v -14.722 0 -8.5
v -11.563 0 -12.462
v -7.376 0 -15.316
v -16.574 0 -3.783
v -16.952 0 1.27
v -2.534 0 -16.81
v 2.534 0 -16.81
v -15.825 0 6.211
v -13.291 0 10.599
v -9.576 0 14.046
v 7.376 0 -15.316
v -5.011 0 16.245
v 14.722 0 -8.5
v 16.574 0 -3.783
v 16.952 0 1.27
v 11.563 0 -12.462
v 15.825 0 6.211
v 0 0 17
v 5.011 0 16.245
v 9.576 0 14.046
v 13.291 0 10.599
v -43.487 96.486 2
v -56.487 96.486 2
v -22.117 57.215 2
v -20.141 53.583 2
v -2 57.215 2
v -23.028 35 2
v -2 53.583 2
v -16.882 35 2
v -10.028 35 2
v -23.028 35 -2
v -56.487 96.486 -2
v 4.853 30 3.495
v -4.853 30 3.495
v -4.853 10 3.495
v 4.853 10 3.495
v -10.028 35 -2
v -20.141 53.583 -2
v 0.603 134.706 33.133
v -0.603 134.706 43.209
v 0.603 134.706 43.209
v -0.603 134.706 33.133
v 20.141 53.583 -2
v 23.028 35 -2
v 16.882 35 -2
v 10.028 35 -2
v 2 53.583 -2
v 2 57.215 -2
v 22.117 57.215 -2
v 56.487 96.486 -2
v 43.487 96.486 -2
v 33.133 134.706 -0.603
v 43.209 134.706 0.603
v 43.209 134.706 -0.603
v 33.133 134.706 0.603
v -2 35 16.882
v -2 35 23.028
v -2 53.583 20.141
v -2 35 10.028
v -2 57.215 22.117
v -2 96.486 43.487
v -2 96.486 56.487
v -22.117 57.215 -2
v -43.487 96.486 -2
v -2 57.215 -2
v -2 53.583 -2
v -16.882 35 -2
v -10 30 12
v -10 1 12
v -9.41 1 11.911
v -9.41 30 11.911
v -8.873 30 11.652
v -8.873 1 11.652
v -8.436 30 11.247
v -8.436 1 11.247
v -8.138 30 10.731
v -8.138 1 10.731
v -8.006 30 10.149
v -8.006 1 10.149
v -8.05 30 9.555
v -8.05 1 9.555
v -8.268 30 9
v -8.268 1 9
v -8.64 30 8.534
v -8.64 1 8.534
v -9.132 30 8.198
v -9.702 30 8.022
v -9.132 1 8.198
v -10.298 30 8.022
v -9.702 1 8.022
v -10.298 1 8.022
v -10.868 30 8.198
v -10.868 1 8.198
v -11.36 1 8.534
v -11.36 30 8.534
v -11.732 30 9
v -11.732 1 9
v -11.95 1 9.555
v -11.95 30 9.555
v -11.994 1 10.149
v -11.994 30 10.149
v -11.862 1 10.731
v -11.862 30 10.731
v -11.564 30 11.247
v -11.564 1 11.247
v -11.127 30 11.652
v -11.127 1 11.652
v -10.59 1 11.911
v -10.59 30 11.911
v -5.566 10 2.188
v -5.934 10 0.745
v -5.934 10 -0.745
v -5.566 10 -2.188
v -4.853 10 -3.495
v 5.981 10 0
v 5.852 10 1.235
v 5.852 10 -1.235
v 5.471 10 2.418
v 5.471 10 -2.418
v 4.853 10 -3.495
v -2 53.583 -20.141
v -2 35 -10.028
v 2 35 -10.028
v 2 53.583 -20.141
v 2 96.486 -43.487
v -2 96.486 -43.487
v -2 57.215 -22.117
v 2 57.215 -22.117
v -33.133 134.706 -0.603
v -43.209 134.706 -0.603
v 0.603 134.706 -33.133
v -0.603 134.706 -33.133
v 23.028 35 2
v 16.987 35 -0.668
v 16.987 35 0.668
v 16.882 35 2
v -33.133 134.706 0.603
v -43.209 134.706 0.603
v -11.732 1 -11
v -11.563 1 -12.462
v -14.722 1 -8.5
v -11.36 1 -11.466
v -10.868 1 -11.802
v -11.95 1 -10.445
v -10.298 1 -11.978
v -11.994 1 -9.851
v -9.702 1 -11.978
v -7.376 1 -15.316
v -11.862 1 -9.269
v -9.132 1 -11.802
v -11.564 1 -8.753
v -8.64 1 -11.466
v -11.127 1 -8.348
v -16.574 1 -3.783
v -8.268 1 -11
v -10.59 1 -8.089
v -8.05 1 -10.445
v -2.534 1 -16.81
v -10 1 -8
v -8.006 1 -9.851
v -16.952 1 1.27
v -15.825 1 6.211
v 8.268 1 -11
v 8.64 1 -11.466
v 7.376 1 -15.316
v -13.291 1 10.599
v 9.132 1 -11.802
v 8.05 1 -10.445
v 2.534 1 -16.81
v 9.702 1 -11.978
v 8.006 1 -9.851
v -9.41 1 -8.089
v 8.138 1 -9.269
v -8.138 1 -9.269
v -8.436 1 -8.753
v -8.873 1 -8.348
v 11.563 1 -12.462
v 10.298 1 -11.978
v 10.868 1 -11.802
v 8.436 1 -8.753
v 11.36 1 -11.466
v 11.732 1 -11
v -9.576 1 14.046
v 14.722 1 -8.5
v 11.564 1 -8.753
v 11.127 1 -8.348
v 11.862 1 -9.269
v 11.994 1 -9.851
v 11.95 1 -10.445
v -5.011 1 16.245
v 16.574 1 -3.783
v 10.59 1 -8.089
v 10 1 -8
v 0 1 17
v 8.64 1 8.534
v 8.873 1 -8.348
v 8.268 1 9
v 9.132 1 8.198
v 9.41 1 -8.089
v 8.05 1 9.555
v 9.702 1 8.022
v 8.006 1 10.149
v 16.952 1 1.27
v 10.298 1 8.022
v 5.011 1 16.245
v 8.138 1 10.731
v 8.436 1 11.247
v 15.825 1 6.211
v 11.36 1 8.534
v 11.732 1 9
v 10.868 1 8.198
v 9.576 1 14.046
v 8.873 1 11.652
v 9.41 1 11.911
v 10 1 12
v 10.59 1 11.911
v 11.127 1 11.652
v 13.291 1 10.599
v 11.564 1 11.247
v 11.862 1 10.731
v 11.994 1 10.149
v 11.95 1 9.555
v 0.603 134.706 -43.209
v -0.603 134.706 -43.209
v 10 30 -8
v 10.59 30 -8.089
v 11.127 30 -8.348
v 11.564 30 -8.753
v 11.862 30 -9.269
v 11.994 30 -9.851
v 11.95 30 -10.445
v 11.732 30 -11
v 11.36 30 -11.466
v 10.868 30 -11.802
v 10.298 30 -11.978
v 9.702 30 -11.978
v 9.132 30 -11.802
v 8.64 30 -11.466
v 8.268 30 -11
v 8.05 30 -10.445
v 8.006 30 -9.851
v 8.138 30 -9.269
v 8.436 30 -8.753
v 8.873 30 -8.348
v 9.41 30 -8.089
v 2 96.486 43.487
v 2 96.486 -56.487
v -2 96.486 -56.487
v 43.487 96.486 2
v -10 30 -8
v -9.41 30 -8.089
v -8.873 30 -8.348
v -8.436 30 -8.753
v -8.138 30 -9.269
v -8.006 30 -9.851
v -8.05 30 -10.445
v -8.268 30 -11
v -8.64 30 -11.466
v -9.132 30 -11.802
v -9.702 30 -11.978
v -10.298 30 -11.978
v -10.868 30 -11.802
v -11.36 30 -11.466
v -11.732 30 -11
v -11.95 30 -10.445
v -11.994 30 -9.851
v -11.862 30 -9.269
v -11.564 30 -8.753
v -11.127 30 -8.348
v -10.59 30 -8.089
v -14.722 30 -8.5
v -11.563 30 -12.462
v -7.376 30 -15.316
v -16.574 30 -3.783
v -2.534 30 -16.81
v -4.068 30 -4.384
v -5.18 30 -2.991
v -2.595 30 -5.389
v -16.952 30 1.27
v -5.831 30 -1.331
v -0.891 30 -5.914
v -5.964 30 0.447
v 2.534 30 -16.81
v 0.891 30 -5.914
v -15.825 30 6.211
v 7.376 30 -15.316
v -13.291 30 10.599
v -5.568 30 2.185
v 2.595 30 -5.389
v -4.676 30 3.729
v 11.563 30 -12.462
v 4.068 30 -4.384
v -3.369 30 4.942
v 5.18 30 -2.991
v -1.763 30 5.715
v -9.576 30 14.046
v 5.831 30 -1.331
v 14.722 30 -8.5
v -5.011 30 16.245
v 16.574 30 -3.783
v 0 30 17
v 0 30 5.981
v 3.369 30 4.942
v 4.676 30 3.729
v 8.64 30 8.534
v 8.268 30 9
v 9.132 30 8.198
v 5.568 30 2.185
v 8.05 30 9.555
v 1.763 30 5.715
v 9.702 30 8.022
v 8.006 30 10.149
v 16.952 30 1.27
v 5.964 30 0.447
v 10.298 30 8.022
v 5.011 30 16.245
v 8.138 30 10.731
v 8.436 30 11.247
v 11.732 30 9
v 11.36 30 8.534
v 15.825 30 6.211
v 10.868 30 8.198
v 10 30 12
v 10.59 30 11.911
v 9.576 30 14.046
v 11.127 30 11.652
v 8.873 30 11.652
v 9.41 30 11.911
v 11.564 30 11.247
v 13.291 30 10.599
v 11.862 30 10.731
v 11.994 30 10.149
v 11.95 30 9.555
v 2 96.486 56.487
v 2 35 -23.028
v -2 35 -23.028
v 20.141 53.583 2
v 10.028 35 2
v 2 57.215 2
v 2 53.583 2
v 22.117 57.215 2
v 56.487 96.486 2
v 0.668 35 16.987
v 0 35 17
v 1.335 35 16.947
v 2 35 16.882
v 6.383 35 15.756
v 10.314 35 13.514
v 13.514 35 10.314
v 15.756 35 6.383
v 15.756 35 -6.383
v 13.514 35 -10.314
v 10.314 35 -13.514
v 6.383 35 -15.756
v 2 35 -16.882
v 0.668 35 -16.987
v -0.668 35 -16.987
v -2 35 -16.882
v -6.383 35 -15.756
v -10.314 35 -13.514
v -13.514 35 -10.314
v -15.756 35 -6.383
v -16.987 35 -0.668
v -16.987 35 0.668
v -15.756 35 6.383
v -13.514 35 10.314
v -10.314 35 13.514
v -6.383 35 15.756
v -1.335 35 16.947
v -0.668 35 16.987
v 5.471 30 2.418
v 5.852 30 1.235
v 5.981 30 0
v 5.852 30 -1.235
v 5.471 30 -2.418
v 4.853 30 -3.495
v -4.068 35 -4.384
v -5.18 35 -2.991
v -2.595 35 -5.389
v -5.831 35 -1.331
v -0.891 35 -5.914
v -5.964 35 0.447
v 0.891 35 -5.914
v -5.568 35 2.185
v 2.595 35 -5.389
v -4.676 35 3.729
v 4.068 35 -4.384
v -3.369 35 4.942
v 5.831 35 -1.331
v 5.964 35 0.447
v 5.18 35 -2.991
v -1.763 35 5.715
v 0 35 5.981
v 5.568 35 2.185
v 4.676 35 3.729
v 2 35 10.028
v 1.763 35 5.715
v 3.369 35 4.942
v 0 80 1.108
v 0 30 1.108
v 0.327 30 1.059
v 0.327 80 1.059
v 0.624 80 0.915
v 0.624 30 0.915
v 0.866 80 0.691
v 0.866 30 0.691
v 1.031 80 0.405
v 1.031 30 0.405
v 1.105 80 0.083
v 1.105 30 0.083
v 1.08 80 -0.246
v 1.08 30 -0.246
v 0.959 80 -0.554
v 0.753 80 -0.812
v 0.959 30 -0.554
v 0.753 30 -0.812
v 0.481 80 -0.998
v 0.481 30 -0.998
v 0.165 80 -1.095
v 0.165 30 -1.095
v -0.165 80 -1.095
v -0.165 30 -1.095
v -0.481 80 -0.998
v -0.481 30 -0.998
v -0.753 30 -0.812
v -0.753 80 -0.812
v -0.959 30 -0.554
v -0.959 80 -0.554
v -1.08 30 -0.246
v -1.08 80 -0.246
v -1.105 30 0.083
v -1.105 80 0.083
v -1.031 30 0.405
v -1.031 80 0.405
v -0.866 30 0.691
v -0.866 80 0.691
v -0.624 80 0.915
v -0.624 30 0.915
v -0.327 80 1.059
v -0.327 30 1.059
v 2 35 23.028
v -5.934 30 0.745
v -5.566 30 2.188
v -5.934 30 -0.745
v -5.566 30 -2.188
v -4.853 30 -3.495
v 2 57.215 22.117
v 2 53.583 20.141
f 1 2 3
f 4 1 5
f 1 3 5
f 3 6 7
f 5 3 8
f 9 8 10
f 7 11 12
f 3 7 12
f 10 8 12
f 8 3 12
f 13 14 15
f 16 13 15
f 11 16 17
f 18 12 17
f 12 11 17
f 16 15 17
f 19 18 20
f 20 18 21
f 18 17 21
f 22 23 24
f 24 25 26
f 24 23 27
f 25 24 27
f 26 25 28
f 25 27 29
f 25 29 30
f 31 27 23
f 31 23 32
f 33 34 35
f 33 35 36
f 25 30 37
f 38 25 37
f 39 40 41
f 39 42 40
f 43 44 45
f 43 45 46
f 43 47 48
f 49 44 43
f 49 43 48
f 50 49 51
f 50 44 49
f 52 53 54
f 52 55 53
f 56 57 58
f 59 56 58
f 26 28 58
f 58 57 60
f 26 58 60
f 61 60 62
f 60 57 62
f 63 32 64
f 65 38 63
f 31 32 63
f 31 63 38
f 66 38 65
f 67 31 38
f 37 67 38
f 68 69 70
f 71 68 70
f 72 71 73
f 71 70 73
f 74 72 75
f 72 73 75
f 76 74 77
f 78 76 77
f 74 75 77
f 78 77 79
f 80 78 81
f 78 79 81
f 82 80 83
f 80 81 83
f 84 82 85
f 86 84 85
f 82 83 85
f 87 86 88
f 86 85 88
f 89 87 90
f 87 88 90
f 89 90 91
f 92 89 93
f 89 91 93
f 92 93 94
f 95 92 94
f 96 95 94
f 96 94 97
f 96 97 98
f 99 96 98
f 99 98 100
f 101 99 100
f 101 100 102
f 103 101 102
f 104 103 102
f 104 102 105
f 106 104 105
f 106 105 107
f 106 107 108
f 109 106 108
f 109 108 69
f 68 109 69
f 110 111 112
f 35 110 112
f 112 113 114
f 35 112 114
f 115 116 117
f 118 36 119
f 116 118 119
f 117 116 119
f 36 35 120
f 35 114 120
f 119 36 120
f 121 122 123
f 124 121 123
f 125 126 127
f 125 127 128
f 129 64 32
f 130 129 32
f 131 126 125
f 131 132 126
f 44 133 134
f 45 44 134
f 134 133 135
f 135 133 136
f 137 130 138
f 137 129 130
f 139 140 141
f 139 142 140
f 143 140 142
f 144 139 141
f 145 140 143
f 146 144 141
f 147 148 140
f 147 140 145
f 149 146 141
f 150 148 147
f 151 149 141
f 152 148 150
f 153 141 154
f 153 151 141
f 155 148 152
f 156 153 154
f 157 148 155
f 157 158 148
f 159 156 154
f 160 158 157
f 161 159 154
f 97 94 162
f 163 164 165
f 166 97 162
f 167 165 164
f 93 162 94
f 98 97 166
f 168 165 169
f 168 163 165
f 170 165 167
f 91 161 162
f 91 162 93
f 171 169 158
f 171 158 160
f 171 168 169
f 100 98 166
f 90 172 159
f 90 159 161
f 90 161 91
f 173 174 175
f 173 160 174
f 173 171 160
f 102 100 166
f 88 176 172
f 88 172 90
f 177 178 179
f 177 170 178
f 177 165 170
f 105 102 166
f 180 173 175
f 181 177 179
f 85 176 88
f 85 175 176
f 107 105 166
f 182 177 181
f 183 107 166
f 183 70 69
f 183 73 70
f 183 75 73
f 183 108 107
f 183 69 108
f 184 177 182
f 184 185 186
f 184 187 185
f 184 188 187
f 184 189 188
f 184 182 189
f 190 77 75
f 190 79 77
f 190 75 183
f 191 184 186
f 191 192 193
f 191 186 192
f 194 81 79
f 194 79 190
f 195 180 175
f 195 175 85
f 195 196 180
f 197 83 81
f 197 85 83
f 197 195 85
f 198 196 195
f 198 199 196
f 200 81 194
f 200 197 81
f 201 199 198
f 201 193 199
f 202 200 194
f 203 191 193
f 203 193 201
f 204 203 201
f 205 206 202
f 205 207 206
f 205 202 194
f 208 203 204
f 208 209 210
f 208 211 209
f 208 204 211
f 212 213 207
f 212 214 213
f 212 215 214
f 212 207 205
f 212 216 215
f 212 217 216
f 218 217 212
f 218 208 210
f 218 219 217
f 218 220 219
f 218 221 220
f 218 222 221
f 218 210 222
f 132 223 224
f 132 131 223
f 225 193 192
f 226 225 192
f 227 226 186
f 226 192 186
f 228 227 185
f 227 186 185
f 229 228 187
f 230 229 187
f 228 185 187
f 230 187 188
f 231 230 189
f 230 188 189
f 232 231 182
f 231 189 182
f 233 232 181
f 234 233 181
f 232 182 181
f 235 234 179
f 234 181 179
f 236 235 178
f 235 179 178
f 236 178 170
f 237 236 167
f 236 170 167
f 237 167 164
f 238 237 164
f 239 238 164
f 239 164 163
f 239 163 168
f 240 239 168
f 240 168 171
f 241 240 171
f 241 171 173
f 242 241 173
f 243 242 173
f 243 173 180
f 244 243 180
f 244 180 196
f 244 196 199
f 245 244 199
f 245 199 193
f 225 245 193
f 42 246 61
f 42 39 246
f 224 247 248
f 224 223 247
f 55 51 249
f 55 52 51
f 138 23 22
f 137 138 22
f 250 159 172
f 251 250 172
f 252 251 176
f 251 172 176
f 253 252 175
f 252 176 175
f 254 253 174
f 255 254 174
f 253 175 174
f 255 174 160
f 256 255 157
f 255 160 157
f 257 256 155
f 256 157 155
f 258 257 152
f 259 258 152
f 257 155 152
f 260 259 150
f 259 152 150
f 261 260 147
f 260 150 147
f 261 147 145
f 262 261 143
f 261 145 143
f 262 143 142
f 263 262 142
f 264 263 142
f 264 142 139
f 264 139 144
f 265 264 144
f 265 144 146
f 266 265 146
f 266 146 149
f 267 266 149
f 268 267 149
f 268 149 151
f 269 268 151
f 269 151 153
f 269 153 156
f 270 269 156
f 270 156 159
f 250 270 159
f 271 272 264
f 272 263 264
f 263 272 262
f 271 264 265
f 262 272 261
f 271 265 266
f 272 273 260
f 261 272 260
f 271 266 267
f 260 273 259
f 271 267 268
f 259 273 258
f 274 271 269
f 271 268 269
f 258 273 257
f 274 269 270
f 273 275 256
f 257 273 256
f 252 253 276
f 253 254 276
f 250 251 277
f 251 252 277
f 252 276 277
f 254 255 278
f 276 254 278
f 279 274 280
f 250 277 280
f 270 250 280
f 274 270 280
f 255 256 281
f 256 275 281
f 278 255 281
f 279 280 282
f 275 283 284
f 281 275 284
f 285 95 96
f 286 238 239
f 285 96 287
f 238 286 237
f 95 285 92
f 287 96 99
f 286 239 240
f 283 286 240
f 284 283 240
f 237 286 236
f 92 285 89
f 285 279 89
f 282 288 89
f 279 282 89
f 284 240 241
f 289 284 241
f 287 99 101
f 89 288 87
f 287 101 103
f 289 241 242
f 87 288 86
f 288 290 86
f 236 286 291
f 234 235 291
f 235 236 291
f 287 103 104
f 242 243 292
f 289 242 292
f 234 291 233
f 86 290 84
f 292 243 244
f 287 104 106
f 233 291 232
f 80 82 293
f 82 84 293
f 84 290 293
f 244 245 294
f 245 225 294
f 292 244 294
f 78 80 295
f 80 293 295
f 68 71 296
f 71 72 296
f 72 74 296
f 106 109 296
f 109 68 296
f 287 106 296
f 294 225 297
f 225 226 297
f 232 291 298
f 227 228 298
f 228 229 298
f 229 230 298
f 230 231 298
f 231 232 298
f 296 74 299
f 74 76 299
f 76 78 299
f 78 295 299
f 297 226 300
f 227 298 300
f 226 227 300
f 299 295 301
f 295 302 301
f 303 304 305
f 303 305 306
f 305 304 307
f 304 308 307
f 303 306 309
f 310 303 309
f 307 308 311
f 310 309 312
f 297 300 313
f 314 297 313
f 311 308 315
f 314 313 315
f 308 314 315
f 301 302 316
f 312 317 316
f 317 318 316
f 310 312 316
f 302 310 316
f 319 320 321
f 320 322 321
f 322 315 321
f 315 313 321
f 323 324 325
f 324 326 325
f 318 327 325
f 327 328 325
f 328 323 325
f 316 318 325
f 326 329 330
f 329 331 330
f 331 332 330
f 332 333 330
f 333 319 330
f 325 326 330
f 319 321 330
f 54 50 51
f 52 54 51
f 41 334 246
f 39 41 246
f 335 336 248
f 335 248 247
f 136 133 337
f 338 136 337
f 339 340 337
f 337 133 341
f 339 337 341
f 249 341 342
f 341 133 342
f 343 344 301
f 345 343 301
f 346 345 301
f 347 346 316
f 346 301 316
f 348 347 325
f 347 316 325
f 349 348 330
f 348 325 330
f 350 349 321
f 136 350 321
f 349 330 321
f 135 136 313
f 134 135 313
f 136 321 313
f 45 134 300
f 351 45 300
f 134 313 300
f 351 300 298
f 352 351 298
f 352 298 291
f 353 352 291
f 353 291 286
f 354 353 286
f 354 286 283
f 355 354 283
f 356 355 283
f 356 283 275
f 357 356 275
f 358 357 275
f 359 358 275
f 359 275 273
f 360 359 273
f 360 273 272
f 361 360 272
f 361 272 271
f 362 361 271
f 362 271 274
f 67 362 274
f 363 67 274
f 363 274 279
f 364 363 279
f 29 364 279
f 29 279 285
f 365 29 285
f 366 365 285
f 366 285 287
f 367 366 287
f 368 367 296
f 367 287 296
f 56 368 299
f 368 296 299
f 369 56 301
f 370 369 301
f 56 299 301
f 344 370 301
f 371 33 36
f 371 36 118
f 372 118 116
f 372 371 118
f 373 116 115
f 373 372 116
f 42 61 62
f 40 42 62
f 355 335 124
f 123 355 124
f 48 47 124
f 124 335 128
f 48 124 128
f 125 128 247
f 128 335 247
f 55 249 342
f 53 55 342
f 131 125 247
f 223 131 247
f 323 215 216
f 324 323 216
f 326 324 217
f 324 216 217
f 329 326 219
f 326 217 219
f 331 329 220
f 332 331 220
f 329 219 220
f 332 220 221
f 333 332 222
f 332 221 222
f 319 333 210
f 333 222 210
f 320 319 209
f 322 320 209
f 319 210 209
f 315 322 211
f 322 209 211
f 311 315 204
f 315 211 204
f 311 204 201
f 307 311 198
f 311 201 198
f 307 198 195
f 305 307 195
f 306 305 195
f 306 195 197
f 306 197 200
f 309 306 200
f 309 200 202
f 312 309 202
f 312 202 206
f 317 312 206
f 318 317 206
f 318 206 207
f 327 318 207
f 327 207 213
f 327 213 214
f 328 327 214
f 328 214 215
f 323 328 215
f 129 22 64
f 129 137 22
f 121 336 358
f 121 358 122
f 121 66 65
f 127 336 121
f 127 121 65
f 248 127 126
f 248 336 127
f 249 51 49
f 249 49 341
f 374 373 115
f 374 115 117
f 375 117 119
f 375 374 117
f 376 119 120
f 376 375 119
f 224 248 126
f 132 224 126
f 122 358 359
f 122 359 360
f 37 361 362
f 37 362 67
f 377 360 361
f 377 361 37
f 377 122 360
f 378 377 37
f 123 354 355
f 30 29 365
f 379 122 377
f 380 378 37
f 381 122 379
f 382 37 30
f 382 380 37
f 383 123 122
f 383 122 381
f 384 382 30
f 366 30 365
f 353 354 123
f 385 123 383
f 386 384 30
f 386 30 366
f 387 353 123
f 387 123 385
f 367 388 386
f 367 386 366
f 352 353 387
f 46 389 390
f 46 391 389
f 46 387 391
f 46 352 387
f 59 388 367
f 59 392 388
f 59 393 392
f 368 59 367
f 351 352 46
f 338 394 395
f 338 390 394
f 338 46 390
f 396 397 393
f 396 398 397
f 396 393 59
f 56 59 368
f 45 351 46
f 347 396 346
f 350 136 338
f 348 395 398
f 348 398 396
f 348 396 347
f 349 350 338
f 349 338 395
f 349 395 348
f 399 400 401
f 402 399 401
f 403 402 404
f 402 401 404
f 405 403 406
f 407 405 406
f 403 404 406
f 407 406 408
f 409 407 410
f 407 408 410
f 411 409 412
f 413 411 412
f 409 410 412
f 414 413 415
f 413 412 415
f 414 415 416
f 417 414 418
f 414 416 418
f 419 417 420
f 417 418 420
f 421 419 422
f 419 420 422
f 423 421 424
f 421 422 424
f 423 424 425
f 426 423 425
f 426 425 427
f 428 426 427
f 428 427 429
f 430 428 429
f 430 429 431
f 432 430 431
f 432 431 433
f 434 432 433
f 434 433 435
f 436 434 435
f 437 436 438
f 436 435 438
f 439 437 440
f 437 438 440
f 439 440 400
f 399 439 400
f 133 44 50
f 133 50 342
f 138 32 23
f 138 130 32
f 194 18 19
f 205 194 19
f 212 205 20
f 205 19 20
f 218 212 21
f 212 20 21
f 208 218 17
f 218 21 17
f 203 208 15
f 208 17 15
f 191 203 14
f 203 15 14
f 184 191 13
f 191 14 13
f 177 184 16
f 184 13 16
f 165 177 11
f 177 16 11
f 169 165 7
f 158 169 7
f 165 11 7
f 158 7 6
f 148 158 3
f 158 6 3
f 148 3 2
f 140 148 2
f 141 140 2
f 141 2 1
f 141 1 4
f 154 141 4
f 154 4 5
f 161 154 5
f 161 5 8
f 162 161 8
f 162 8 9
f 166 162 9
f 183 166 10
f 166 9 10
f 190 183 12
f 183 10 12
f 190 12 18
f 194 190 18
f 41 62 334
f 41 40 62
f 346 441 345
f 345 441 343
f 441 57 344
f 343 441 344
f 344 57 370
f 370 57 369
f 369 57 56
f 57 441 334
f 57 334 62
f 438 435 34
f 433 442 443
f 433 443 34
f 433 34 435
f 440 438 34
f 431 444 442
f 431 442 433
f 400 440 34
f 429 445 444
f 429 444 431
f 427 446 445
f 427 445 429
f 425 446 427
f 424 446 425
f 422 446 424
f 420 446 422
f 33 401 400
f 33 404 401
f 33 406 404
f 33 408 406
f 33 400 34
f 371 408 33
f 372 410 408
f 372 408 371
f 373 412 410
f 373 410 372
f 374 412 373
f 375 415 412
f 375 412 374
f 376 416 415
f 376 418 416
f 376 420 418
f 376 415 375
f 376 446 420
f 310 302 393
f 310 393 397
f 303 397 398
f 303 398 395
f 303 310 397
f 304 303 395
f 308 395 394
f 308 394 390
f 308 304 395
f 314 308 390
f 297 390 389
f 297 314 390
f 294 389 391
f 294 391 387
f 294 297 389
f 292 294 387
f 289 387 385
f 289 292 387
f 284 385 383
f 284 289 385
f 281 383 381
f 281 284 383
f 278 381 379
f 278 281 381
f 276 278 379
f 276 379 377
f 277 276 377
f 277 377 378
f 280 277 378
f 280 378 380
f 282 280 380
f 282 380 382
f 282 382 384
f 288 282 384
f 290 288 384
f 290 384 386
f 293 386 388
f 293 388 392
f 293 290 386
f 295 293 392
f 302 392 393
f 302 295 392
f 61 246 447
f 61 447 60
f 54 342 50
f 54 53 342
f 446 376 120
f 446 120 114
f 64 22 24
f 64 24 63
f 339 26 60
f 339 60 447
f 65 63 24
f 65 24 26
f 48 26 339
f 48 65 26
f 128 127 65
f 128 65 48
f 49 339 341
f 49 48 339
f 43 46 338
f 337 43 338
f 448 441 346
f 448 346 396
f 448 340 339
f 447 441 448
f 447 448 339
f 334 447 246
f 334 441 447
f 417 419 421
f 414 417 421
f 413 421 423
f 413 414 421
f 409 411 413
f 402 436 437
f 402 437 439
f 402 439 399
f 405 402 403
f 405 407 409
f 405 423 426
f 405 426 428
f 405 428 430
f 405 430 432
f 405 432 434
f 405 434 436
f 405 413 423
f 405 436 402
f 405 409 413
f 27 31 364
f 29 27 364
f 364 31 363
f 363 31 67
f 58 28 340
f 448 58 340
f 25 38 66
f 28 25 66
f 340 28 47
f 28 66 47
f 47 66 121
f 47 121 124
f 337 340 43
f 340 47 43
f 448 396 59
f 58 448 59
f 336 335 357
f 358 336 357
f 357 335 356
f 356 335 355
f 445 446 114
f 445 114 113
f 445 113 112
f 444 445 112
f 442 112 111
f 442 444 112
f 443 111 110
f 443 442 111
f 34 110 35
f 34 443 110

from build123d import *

# Parameters (mm, degrees)
SKETCH1_R            = 17
SKETCH1_R_2          = 2
BOSS_EXTRUDE1_DEPTH  = 1
SKETCH1_3_R          = 2
BOSS_EXTRUDE2_DEPTH  = 30
SKETCH2_R            = 17
SKETCH2_R_2          = 5.981003934
SKETCH2_R_3          = 2
BOSS_EXTRUDE3_DEPTH  = 5
BOSS_EXTRUDE4_DEPTH  = 20
SKETCH3_R            = 1.107736243
BOSS_EXTRUDE5_DEPTH  = 50
SKETCH4_W            = 13
SKETCH4_H            = 4
BOSS_EXTRUDE7_DEPTH  = 70
CIRPATTERN1_COUNT    = 4
CIRPATTERN2_COUNT    = 4
SKETCH9_W            = 4
SKETCH9_H            = 4.134305267
BOSS_EXTRUDE12_DEPTH = 25
CIRPATTERN8_COUNT    = 4


with BuildPart() as part:
    # Sketch1 → Boss-Extrude1 (new body)
    with BuildSketch(Plane(origin=(0, 0, 0), x_dir=(1, 0, 0), z_dir=(0, 1, 0))):
        with Locations(Location((0, 0, 0), (0, 0, 270))):
            Circle(SKETCH1_R)
        with Locations(Location((-10, 10, 0), (0, 0, 270))):
            Circle(SKETCH1_R_2, mode=Mode.SUBTRACT)
        with Locations(Location((10, 10, 0), (0, 0, 270))):
            Circle(SKETCH1_R_2, mode=Mode.SUBTRACT)
        with Locations(Location((10, -10, 0), (0, 0, 270))):
            Circle(SKETCH1_R_2, mode=Mode.SUBTRACT)
        with Locations(Location((-10, -10, 0), (0, 0, 270))):
            Circle(SKETCH1_R_2, mode=Mode.SUBTRACT)
    extrude(amount=BOSS_EXTRUDE1_DEPTH)

    # Sketch1<3> → Boss-Extrude2 (add)
    with BuildSketch(Plane(origin=(0, 0, 0), x_dir=(1, 0, 0), z_dir=(0, 1, 0))):
        with Locations(Location((-10, 10, 0), (0, 0, 270))):
            Circle(SKETCH1_3_R)
        with Locations(Location((10, 10, 0), (0, 0, 270))):
            Circle(SKETCH1_3_R)
        with Locations(Location((10, -10, 0), (0, 0, 270))):
            Circle(SKETCH1_3_R)
        with Locations(Location((-10, -10, 0), (0, 0, 270))):
            Circle(SKETCH1_3_R)
    extrude(amount=BOSS_EXTRUDE2_DEPTH)

    # Sketch2 → Boss-Extrude3 (add)
    # profile 1 of 2: a face of its own
    with BuildSketch(Plane(origin=(0, 30, 0), x_dir=(1, 0, 0), z_dir=(0, 1, 0))):
        with Locations(Location((0, 0, 0), (0, 0, 270))):
            Circle(SKETCH2_R)
        with Locations(Location((0, 0, 0), (0, 0, 270))):
            Circle(SKETCH2_R_2, mode=Mode.SUBTRACT)
        with Locations(Location((-10, 10, 0), (0, 0, 270))):
            Circle(SKETCH2_R_3, mode=Mode.SUBTRACT)
    # profile 2 of 2: a face of its own
    with BuildSketch(Plane(origin=(0, 30, 0), x_dir=(1, 0, 0), z_dir=(0, 1, 0))):
        with Locations(Location((-10, 10, 0), (0, 0, 270))):
            Circle(SKETCH2_R_3)
    extrude(amount=BOSS_EXTRUDE3_DEPTH)

    # Sketch4 → Boss-Extrude7 (add, along a direction that is not the sketch's normal)
    with BuildSketch(Plane(origin=(0, 35, 0), x_dir=(1, 0, 0), z_dir=(0, 1, 0))):
        with Locations((-16.527954488, 0)):
            Rectangle(SKETCH4_W, SKETCH4_H)
    boss_extrude7 = extrude(amount=BOSS_EXTRUDE7_DEPTH, dir=(-0.47798722714939545, 0.8783667859624659, 0))

    # Boss-Extrude8: read off the stored shape, not the designer's step
    # Boss-Extrude8: loft between two sections, ruled curve by curve
    boss_extrude8_from = [
        Edge.make_line((-56.487060388, 96.485675017, -2), (-56.487060388, 96.485675017, 2)),
        Edge.make_line((-56.487060388, 96.485675017, 2), (-43.487060388, 96.485675017, 2)),
        Edge.make_line((-43.487060388, 96.485675017, 2), (-43.487060388, 96.485675017, -2)),
        Edge.make_line((-43.487060388, 96.485675017, -2), (-56.487060388, 96.485675017, -2)),
    ]
    boss_extrude8_to = [
        Edge.make_line((-43.209188151, 134.705549787, -0.603088029), (-43.209188151, 134.705549787, 0.603088029)),
        Edge.make_line((-43.209188151, 134.705549787, 0.603088029), (-33.133306924, 134.705549787, 0.603088029)),
        Edge.make_line((-33.133306924, 134.705549787, 0.603088029), (-33.133306924, 134.705549787, -0.603088029)),
        Edge.make_line((-33.133306924, 134.705549787, -0.603088029), (-43.209188151, 134.705549787, -0.603088029)),
    ]
    boss_extrude8 = Solid(Shell([*[Face.make_surface_from_curves(boss_extrude8_from[k], boss_extrude8_to[k]) for k in range(4)], Face(Wire(boss_extrude8_from)), Face(Wire(boss_extrude8_to))]))
    add(boss_extrude8)

    # CirPattern1: Boss-Extrude7 ×4 about axis
    cirpattern1_axis = Axis((0, 0, 0), (0, 1, 0))
    for i in range(1, CIRPATTERN1_COUNT):
        add(boss_extrude7.rotate(cirpattern1_axis, i * 360 / CIRPATTERN1_COUNT))

    # CirPattern2: Boss-Extrude8 ×4 about axis
    cirpattern2_axis = Axis((0, 0, 0), (0, 1, 0))
    for i in range(1, CIRPATTERN2_COUNT):
        add(boss_extrude8.rotate(cirpattern2_axis, i * 360 / CIRPATTERN2_COUNT))

    # Sketch9 → Boss-Extrude12 (add, along a direction that is not the sketch's normal)
    with BuildSketch(Plane(origin=(6.957833873, 3.786294943, 0), x_dir=(0, 0, -1), z_dir=(0.8783667859624659, 0.47798722714939545, 0))):
        with Locations((0, 58.75999588)):
            Rectangle(SKETCH9_W, SKETCH9_H)
    boss_extrude12 = extrude(amount=BOSS_EXTRUDE12_DEPTH, dir=(1, 0, 0))

    # CirPattern8: Boss-Extrude12 ×4 about axis
    cirpattern8_axis = Axis((0, 80, 0), (0, 1, 0))
    for i in range(1, CIRPATTERN8_COUNT):
        add(boss_extrude12.rotate(cirpattern8_axis, i * 360 / CIRPATTERN8_COUNT))


with BuildPart() as body_2:
    # Sketch2<3> → Boss-Extrude4 (new body)
    with BuildSketch(Plane(origin=(0, 30, 0), x_dir=(1, 0, 0), z_dir=(0, 1, 0))):
        with BuildLine():
            Line((4.853270007, 3.495451086), (-4.853270007, 3.495451086))
            ThreePointArc((-4.853270007, 3.495451086), (-5.981003934, 0), (-4.853270007, -3.495451086))
            Line((-4.853270007, -3.495451086), (4.853270007, -3.495451086))
            ThreePointArc((4.853270007, -3.495451086), (5.692092544, -1.836434188), (5.981003934, 0))
            ThreePointArc((5.981003934, 0), (5.692092544, 1.836434188), (4.853270007, 3.495451086))
        make_face()
    extrude(amount=-BOSS_EXTRUDE4_DEPTH)

    # Sketch3 → Boss-Extrude5 (add)
    with BuildSketch(Plane(origin=(0, 30, 0), x_dir=(1, 0, 0), z_dir=(0, 1, 0))):
        with Locations(Location((0, 0, 0), (0, 0, 270))):
            Circle(SKETCH3_R)
    extrude(amount=BOSS_EXTRUDE5_DEPTH)


solid = Compound([part.part, body_2.part])
